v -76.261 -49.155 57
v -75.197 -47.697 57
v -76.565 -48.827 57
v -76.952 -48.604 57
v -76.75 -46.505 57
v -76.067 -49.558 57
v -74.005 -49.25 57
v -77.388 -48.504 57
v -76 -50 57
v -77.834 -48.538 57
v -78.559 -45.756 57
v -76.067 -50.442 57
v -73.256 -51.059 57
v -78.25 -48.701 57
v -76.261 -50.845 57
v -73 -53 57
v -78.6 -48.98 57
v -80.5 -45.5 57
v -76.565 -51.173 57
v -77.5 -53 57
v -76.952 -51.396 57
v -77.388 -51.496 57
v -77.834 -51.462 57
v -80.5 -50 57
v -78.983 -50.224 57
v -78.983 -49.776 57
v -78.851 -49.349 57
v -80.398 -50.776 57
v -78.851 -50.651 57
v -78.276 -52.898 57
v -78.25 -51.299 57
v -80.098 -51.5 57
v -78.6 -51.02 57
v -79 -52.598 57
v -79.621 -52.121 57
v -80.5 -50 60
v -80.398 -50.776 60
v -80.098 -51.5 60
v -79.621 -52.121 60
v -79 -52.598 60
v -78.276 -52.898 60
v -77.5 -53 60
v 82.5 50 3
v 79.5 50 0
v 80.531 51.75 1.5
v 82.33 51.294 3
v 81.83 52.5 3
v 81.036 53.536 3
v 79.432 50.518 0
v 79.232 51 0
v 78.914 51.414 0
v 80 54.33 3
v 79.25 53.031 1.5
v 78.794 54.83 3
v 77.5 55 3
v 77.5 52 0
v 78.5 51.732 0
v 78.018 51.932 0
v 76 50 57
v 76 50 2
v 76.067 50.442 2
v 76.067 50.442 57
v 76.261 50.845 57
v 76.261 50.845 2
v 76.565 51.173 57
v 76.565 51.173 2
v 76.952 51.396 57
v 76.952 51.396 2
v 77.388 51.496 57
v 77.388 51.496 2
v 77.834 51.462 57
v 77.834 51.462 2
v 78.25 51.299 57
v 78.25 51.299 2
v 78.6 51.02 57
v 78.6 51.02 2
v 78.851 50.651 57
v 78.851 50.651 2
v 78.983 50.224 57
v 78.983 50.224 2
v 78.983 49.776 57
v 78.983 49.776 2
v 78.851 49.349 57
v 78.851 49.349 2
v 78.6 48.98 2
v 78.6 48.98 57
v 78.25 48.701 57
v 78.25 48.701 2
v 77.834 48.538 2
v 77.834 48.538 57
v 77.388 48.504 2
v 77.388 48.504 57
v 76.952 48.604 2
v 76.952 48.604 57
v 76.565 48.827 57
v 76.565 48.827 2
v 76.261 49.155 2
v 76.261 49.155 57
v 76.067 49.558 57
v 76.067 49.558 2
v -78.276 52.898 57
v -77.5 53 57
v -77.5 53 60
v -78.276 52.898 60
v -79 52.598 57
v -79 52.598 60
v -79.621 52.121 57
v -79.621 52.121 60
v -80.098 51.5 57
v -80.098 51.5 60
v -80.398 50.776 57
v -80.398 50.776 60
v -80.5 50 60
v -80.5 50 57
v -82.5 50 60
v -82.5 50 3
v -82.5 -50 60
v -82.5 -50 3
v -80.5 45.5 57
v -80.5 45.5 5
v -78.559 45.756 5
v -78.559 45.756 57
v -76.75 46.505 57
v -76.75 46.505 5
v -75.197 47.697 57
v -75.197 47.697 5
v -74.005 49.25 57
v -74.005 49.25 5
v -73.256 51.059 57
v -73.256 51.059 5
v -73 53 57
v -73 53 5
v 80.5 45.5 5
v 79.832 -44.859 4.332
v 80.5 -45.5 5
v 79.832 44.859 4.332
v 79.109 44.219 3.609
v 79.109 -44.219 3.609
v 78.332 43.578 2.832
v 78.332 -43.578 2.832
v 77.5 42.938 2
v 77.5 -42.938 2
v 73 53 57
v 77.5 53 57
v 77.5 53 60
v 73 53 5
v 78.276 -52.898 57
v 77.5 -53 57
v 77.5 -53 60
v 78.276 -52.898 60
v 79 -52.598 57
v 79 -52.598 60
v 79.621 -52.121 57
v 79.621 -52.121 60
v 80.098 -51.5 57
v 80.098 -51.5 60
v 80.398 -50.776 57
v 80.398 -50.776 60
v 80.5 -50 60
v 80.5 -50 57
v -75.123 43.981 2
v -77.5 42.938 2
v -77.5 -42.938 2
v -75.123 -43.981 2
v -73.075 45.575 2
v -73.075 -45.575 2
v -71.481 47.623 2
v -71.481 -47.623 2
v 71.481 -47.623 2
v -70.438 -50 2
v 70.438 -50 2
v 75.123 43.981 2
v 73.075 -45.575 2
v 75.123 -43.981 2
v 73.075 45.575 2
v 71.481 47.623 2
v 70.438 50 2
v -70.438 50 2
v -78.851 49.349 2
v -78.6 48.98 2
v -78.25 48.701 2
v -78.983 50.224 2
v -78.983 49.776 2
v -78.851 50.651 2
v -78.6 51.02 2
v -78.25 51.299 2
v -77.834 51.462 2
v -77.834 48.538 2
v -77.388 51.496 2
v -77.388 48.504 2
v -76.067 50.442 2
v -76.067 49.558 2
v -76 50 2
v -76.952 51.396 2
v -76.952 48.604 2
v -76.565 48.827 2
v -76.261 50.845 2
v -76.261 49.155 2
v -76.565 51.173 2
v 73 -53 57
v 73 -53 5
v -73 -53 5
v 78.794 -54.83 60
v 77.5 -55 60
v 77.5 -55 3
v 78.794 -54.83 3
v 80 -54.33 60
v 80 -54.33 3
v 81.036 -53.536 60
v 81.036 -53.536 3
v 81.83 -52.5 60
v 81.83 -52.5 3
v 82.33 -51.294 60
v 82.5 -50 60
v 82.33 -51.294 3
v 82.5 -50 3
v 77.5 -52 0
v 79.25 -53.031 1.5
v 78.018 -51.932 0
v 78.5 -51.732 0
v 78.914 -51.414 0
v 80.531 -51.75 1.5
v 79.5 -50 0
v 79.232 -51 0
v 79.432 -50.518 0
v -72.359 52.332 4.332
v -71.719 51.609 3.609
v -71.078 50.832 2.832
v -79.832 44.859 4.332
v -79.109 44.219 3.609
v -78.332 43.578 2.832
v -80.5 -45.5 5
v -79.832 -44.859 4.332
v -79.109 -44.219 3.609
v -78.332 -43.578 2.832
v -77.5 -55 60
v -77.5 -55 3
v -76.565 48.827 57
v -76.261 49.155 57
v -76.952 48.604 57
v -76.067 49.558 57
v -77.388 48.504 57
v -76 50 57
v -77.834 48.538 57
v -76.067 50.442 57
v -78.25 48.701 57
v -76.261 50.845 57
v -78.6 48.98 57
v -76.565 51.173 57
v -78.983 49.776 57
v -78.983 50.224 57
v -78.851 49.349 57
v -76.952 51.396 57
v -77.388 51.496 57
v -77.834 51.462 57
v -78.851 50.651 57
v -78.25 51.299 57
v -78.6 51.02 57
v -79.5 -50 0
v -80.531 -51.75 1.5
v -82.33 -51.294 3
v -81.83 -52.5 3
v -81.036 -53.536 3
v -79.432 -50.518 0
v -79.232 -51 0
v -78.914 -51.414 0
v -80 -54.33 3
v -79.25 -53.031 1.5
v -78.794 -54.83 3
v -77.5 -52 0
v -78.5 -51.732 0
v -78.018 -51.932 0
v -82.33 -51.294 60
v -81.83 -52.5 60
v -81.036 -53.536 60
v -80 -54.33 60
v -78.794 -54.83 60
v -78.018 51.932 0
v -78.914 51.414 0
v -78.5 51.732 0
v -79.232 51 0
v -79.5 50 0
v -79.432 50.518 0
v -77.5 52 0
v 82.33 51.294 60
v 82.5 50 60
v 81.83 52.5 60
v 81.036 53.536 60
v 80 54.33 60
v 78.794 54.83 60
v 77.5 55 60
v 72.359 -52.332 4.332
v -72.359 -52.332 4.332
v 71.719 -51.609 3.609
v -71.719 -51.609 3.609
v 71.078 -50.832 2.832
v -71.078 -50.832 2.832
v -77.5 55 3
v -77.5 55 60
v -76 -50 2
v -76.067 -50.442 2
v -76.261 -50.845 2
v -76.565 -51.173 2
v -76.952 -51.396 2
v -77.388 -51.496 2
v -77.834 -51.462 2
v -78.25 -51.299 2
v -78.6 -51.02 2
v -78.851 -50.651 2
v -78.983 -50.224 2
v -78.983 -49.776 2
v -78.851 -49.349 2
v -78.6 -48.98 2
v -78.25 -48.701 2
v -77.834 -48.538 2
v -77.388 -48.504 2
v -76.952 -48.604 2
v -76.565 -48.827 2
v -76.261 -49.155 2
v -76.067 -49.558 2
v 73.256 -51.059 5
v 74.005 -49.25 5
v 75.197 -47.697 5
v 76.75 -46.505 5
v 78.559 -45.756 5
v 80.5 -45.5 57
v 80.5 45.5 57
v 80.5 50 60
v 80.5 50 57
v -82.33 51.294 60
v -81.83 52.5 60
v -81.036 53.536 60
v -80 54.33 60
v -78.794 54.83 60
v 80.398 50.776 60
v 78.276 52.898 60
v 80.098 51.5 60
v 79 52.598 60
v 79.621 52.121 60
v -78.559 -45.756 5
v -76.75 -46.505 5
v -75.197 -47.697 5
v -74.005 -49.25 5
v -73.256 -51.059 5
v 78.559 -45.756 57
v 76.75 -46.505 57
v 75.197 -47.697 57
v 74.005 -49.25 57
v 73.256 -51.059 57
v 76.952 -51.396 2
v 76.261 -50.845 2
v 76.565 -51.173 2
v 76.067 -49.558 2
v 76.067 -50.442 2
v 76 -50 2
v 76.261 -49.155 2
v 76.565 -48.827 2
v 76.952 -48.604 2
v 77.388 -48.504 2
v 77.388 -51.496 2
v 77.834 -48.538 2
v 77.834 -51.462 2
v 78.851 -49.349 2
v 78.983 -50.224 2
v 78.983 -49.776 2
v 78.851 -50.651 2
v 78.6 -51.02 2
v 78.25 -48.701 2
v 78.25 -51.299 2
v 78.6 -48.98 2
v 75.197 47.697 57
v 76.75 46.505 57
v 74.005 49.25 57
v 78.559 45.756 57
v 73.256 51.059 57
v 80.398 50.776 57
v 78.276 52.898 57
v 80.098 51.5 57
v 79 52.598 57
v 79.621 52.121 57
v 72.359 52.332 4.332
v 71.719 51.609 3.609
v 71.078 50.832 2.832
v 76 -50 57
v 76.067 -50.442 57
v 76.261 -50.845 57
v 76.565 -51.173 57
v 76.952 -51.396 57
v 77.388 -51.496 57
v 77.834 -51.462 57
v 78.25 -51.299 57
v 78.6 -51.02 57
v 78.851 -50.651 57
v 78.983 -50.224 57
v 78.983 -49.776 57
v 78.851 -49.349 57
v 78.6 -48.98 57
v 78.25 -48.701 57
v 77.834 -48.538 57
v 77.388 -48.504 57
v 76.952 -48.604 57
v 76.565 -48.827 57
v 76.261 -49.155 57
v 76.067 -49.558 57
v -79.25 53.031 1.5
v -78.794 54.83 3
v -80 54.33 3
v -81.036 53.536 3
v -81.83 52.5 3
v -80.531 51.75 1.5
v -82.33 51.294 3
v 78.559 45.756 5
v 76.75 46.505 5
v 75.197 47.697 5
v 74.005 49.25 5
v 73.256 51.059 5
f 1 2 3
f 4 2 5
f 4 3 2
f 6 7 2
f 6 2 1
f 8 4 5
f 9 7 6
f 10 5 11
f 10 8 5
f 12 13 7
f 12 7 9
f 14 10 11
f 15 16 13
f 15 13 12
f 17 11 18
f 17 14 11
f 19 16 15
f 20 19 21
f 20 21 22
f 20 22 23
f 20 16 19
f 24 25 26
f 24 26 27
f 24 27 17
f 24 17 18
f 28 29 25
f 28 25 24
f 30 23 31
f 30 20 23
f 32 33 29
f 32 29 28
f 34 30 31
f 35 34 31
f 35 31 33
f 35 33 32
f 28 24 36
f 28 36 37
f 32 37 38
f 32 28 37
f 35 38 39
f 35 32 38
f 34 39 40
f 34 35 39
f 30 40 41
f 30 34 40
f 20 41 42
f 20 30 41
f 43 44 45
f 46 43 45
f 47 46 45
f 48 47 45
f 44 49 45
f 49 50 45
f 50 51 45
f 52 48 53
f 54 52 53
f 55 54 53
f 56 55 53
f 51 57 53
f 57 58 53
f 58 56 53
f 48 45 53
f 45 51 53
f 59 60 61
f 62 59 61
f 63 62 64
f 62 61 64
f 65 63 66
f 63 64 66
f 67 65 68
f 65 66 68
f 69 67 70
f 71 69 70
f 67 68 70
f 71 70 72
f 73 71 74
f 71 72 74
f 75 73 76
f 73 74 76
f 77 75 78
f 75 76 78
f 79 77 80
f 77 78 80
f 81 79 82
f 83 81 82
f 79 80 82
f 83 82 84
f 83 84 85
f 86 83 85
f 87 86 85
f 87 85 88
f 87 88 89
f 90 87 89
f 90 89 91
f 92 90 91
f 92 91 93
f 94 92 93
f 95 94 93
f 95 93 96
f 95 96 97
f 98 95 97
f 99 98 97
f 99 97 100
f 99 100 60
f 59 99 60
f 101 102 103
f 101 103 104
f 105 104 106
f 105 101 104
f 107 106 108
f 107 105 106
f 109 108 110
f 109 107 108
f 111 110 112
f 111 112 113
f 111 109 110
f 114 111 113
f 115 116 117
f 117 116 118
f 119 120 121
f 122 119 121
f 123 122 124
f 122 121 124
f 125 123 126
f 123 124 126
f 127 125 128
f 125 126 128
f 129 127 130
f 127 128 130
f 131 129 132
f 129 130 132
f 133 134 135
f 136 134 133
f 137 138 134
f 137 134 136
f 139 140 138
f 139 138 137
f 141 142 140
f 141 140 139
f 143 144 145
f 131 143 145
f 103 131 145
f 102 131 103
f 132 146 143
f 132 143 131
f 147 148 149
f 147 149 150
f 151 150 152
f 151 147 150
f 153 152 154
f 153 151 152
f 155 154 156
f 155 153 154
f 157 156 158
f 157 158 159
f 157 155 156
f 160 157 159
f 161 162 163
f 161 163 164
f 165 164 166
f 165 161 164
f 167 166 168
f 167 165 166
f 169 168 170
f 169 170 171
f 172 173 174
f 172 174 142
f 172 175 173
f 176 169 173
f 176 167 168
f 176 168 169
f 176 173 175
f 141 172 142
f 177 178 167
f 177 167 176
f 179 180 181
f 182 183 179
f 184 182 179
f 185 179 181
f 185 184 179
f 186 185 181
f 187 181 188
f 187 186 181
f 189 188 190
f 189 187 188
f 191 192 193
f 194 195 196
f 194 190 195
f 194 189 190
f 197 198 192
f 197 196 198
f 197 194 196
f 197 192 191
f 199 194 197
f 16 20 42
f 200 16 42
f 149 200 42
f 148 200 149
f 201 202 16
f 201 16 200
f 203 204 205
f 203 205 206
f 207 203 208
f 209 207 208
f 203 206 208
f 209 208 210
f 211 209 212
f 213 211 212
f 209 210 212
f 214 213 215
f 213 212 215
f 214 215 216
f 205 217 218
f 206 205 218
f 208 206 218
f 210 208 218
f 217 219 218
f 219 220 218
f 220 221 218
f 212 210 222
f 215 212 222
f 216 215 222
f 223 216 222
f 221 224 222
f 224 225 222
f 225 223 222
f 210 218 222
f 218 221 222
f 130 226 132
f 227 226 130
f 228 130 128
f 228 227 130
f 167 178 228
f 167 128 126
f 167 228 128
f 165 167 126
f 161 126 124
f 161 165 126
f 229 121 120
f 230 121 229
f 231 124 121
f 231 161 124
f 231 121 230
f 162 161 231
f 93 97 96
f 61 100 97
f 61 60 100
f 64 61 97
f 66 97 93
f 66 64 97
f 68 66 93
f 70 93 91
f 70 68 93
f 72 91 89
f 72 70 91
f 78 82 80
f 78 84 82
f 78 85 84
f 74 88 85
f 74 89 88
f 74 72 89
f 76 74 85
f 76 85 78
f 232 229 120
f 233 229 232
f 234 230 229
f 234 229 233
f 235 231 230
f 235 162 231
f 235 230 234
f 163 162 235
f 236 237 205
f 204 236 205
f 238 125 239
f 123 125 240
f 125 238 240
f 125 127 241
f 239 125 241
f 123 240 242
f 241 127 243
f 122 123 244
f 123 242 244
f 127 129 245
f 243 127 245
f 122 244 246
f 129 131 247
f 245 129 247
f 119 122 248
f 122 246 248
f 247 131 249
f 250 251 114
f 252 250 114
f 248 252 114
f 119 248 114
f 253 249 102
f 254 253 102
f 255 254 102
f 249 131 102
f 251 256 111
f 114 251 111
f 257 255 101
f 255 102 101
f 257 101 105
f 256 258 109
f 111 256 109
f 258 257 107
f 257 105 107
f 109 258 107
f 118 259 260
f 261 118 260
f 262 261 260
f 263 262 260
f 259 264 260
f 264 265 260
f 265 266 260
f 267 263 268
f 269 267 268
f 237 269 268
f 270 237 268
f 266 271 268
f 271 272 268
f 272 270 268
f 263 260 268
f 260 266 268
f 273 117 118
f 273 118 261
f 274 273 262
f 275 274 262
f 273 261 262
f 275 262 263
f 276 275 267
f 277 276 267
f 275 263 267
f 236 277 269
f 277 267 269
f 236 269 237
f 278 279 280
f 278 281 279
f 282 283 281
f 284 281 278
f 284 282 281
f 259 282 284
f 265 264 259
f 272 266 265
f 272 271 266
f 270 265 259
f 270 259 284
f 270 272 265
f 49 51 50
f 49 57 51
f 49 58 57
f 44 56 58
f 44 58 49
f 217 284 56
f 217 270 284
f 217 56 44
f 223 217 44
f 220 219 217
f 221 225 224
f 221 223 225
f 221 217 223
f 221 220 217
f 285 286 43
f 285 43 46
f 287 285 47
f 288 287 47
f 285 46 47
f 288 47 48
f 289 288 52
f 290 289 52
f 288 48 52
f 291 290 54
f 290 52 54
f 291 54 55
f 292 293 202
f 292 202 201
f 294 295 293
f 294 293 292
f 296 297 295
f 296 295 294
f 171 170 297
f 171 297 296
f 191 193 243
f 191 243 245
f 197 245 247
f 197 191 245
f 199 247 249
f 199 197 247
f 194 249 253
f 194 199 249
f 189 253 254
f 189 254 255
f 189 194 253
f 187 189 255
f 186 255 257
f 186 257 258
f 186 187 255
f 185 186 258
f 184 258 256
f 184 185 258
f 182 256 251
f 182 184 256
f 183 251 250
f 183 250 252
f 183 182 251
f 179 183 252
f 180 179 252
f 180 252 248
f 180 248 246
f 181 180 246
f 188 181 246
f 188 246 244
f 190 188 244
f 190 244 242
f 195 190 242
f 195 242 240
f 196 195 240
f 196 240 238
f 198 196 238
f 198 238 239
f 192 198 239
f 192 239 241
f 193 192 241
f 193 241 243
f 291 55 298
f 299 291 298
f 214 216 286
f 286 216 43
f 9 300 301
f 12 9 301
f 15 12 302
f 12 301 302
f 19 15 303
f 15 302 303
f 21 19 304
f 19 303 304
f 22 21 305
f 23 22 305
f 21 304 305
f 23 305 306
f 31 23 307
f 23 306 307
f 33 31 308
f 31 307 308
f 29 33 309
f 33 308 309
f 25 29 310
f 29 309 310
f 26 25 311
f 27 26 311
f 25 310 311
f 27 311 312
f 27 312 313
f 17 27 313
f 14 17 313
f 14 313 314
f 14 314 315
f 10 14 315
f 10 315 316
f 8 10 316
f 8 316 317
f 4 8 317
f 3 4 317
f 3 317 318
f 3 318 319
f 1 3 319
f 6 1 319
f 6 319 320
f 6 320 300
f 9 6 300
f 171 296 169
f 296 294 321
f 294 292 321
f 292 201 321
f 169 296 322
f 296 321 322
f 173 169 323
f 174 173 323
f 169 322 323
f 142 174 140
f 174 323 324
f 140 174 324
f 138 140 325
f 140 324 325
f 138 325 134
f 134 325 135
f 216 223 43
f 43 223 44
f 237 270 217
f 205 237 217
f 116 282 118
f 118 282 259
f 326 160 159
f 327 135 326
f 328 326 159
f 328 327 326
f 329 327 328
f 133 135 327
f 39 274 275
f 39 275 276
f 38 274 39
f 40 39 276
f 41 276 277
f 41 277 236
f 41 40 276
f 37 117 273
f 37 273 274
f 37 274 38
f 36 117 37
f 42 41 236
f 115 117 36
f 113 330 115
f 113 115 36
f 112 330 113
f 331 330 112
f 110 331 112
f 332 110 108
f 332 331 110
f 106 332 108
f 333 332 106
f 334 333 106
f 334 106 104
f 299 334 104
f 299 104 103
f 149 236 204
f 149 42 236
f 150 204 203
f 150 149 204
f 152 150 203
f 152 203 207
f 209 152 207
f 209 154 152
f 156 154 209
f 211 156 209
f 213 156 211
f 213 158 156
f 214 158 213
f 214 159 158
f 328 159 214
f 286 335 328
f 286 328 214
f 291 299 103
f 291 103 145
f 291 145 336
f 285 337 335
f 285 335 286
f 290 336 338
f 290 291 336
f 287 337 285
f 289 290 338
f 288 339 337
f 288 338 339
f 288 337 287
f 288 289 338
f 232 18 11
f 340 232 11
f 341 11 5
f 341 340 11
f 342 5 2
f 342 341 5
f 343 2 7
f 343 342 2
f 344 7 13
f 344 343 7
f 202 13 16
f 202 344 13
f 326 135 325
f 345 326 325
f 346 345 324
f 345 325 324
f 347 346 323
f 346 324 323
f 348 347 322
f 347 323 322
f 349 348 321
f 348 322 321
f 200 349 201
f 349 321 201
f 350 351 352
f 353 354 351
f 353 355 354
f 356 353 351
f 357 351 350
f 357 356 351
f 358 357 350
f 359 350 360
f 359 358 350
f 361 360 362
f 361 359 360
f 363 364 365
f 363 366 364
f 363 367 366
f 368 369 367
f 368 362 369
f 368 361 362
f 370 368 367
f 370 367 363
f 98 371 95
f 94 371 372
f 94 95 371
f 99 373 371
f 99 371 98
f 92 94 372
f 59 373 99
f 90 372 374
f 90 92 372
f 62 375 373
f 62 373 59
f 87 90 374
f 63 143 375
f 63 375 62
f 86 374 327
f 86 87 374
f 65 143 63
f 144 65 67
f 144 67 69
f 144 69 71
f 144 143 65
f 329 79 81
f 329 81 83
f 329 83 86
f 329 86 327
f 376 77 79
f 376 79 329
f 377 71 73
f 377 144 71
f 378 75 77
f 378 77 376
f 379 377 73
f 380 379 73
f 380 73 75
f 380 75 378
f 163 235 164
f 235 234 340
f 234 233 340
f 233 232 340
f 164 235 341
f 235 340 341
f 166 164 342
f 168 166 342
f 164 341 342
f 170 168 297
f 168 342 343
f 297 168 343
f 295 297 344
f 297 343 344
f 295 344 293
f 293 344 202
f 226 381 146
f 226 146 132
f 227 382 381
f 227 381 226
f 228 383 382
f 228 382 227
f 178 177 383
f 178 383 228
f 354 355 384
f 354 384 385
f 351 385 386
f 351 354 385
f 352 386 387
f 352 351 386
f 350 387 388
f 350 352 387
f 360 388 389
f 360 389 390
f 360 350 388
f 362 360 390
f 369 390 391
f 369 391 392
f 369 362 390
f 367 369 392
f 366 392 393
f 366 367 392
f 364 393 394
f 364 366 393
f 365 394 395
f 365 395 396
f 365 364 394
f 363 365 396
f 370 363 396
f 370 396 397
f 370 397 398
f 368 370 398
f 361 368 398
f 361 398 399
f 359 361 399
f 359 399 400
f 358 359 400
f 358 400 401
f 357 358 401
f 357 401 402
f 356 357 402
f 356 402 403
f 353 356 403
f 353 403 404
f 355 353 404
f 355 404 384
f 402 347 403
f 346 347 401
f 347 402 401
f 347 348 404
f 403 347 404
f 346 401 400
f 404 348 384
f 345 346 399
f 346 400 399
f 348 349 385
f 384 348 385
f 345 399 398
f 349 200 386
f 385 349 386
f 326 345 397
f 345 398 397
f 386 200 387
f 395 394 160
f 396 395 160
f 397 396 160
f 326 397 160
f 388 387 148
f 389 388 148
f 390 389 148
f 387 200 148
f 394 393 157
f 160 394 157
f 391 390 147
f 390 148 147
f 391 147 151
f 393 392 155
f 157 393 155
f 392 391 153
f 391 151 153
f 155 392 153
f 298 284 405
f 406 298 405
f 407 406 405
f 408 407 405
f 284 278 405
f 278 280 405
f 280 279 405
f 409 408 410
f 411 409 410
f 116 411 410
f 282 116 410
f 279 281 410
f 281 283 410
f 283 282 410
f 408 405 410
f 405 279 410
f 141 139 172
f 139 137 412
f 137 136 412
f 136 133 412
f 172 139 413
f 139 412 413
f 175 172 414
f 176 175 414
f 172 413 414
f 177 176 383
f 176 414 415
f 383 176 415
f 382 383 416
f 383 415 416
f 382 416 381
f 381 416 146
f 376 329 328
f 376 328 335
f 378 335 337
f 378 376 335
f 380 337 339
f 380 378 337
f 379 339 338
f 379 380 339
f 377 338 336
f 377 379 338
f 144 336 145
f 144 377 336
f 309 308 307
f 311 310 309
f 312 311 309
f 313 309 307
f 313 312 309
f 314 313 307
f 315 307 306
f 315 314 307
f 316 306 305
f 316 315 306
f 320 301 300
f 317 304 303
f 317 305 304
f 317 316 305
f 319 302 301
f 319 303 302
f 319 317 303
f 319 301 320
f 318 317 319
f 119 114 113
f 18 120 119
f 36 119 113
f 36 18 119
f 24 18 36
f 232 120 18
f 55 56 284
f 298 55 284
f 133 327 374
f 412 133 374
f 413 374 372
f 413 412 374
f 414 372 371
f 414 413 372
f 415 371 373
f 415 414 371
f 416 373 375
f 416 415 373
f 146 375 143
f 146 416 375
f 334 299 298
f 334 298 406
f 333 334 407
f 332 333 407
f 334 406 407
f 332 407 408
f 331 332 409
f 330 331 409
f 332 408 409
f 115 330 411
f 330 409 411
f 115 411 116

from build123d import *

# Parameters (mm, degrees)
PAD_DEPTH               = 60
THICKNESS_T             = -2
SKETCH001_R             = 1.5
PAD001_DEPTH            = 57
SKETCH001_MIRRORED_2_R  = 1.5
PAD001_MIRRORED_2_DEPTH = 57
CHAMFER001_SIZE         = 3
CHAMFER003_SIZE         = 3


with BuildPart() as part:
    # Sketch → Pad (new body)
    with BuildSketch(Plane.XY):
        with BuildLine():
            Line((-82.5, 50), (-82.5, -50))
            ThreePointArc((-82.5, -50), (-81.035534, -53.535534), (-77.5, -55))
            Line((-77.5, -55), (77.5, -55))
            ThreePointArc((77.5, -55), (81.035534, -53.535534), (82.5, -50))
            Line((82.5, -50), (82.5, 50))
            ThreePointArc((82.5, 50), (81.035534, 53.535534), (77.5, 55))
            Line((77.5, 55), (-77.5, 55))
            ThreePointArc((-77.5, 55), (-81.035534, 53.535534), (-82.5, 50))
        make_face()
    extrude(amount=PAD_DEPTH)

    # Thickness
    thickness_openings = [part.faces().sort_by_distance(p)[0] for p in [
        (0, 0, 60),
    ]]
    offset(amount=THICKNESS_T, openings=thickness_openings)

    # Sketch001 → Pad001 (join)
    with BuildSketch(Plane.XY):
        with BuildLine():
            Line((-80.5, 53), (-73, 53))
            ThreePointArc((-80.5, 45.5), (-75.196699, 47.696699), (-73, 53))
            Line((-80.5, 53), (-80.5, 45.5))
        make_face()
        with Locations((-77.5, 50)):
            Circle(SKETCH001_R, mode=Mode.SUBTRACT)
    pad001 = extrude(amount=PAD001_DEPTH)

    # Sketch001 Mirrored 2 → Pad001 Mirrored 2 (add)
    with BuildSketch(Plane(origin=(0, 0, 0), x_dir=(-1, 0, 0), z_dir=(0, 0, -1))):
        with BuildLine():
            Line((-80.5, 53), (-73, 53))
            ThreePointArc((-80.5, 45.5), (-75.196699, 47.696699), (-73, 53))
            Line((-80.5, 53), (-80.5, 45.5))
        make_face()
        with Locations((-77.5, 50)):
            Circle(SKETCH001_MIRRORED_2_R, mode=Mode.SUBTRACT)
    pad001_mirrored_2 = extrude(amount=-PAD001_MIRRORED_2_DEPTH)

    # Mirrored001: Pad001, Pad001 Mirrored 2 across Sketch001 H_Axis
    add(pad001.mirror(Plane.ZX))
    add(pad001_mirrored_2.mirror(Plane.ZX))

    # Chamfer001
    chamfer001_edges = [part.edges().sort_by_distance(p)[0] for p in [
        (-75.196699, 47.696699, 2),
        (75.196699, 47.696699, 2),
        (75.196699, -47.696699, 2),
        (-75.196699, -47.696699, 2),
        (0, 53, 2),
        (-80.5, 0, 2),
        (0, -53, 2),
        (80.5, 0, 2),
    ]]
    chamfer(chamfer001_edges, length=CHAMFER001_SIZE)

    # Chamfer003
    chamfer003_edges = [part.edges().sort_by_distance(p)[0] for p in [
        (0, -55, 0),
    ]]
    chamfer(chamfer003_edges, length=CHAMFER003_SIZE)


solid = part.part
